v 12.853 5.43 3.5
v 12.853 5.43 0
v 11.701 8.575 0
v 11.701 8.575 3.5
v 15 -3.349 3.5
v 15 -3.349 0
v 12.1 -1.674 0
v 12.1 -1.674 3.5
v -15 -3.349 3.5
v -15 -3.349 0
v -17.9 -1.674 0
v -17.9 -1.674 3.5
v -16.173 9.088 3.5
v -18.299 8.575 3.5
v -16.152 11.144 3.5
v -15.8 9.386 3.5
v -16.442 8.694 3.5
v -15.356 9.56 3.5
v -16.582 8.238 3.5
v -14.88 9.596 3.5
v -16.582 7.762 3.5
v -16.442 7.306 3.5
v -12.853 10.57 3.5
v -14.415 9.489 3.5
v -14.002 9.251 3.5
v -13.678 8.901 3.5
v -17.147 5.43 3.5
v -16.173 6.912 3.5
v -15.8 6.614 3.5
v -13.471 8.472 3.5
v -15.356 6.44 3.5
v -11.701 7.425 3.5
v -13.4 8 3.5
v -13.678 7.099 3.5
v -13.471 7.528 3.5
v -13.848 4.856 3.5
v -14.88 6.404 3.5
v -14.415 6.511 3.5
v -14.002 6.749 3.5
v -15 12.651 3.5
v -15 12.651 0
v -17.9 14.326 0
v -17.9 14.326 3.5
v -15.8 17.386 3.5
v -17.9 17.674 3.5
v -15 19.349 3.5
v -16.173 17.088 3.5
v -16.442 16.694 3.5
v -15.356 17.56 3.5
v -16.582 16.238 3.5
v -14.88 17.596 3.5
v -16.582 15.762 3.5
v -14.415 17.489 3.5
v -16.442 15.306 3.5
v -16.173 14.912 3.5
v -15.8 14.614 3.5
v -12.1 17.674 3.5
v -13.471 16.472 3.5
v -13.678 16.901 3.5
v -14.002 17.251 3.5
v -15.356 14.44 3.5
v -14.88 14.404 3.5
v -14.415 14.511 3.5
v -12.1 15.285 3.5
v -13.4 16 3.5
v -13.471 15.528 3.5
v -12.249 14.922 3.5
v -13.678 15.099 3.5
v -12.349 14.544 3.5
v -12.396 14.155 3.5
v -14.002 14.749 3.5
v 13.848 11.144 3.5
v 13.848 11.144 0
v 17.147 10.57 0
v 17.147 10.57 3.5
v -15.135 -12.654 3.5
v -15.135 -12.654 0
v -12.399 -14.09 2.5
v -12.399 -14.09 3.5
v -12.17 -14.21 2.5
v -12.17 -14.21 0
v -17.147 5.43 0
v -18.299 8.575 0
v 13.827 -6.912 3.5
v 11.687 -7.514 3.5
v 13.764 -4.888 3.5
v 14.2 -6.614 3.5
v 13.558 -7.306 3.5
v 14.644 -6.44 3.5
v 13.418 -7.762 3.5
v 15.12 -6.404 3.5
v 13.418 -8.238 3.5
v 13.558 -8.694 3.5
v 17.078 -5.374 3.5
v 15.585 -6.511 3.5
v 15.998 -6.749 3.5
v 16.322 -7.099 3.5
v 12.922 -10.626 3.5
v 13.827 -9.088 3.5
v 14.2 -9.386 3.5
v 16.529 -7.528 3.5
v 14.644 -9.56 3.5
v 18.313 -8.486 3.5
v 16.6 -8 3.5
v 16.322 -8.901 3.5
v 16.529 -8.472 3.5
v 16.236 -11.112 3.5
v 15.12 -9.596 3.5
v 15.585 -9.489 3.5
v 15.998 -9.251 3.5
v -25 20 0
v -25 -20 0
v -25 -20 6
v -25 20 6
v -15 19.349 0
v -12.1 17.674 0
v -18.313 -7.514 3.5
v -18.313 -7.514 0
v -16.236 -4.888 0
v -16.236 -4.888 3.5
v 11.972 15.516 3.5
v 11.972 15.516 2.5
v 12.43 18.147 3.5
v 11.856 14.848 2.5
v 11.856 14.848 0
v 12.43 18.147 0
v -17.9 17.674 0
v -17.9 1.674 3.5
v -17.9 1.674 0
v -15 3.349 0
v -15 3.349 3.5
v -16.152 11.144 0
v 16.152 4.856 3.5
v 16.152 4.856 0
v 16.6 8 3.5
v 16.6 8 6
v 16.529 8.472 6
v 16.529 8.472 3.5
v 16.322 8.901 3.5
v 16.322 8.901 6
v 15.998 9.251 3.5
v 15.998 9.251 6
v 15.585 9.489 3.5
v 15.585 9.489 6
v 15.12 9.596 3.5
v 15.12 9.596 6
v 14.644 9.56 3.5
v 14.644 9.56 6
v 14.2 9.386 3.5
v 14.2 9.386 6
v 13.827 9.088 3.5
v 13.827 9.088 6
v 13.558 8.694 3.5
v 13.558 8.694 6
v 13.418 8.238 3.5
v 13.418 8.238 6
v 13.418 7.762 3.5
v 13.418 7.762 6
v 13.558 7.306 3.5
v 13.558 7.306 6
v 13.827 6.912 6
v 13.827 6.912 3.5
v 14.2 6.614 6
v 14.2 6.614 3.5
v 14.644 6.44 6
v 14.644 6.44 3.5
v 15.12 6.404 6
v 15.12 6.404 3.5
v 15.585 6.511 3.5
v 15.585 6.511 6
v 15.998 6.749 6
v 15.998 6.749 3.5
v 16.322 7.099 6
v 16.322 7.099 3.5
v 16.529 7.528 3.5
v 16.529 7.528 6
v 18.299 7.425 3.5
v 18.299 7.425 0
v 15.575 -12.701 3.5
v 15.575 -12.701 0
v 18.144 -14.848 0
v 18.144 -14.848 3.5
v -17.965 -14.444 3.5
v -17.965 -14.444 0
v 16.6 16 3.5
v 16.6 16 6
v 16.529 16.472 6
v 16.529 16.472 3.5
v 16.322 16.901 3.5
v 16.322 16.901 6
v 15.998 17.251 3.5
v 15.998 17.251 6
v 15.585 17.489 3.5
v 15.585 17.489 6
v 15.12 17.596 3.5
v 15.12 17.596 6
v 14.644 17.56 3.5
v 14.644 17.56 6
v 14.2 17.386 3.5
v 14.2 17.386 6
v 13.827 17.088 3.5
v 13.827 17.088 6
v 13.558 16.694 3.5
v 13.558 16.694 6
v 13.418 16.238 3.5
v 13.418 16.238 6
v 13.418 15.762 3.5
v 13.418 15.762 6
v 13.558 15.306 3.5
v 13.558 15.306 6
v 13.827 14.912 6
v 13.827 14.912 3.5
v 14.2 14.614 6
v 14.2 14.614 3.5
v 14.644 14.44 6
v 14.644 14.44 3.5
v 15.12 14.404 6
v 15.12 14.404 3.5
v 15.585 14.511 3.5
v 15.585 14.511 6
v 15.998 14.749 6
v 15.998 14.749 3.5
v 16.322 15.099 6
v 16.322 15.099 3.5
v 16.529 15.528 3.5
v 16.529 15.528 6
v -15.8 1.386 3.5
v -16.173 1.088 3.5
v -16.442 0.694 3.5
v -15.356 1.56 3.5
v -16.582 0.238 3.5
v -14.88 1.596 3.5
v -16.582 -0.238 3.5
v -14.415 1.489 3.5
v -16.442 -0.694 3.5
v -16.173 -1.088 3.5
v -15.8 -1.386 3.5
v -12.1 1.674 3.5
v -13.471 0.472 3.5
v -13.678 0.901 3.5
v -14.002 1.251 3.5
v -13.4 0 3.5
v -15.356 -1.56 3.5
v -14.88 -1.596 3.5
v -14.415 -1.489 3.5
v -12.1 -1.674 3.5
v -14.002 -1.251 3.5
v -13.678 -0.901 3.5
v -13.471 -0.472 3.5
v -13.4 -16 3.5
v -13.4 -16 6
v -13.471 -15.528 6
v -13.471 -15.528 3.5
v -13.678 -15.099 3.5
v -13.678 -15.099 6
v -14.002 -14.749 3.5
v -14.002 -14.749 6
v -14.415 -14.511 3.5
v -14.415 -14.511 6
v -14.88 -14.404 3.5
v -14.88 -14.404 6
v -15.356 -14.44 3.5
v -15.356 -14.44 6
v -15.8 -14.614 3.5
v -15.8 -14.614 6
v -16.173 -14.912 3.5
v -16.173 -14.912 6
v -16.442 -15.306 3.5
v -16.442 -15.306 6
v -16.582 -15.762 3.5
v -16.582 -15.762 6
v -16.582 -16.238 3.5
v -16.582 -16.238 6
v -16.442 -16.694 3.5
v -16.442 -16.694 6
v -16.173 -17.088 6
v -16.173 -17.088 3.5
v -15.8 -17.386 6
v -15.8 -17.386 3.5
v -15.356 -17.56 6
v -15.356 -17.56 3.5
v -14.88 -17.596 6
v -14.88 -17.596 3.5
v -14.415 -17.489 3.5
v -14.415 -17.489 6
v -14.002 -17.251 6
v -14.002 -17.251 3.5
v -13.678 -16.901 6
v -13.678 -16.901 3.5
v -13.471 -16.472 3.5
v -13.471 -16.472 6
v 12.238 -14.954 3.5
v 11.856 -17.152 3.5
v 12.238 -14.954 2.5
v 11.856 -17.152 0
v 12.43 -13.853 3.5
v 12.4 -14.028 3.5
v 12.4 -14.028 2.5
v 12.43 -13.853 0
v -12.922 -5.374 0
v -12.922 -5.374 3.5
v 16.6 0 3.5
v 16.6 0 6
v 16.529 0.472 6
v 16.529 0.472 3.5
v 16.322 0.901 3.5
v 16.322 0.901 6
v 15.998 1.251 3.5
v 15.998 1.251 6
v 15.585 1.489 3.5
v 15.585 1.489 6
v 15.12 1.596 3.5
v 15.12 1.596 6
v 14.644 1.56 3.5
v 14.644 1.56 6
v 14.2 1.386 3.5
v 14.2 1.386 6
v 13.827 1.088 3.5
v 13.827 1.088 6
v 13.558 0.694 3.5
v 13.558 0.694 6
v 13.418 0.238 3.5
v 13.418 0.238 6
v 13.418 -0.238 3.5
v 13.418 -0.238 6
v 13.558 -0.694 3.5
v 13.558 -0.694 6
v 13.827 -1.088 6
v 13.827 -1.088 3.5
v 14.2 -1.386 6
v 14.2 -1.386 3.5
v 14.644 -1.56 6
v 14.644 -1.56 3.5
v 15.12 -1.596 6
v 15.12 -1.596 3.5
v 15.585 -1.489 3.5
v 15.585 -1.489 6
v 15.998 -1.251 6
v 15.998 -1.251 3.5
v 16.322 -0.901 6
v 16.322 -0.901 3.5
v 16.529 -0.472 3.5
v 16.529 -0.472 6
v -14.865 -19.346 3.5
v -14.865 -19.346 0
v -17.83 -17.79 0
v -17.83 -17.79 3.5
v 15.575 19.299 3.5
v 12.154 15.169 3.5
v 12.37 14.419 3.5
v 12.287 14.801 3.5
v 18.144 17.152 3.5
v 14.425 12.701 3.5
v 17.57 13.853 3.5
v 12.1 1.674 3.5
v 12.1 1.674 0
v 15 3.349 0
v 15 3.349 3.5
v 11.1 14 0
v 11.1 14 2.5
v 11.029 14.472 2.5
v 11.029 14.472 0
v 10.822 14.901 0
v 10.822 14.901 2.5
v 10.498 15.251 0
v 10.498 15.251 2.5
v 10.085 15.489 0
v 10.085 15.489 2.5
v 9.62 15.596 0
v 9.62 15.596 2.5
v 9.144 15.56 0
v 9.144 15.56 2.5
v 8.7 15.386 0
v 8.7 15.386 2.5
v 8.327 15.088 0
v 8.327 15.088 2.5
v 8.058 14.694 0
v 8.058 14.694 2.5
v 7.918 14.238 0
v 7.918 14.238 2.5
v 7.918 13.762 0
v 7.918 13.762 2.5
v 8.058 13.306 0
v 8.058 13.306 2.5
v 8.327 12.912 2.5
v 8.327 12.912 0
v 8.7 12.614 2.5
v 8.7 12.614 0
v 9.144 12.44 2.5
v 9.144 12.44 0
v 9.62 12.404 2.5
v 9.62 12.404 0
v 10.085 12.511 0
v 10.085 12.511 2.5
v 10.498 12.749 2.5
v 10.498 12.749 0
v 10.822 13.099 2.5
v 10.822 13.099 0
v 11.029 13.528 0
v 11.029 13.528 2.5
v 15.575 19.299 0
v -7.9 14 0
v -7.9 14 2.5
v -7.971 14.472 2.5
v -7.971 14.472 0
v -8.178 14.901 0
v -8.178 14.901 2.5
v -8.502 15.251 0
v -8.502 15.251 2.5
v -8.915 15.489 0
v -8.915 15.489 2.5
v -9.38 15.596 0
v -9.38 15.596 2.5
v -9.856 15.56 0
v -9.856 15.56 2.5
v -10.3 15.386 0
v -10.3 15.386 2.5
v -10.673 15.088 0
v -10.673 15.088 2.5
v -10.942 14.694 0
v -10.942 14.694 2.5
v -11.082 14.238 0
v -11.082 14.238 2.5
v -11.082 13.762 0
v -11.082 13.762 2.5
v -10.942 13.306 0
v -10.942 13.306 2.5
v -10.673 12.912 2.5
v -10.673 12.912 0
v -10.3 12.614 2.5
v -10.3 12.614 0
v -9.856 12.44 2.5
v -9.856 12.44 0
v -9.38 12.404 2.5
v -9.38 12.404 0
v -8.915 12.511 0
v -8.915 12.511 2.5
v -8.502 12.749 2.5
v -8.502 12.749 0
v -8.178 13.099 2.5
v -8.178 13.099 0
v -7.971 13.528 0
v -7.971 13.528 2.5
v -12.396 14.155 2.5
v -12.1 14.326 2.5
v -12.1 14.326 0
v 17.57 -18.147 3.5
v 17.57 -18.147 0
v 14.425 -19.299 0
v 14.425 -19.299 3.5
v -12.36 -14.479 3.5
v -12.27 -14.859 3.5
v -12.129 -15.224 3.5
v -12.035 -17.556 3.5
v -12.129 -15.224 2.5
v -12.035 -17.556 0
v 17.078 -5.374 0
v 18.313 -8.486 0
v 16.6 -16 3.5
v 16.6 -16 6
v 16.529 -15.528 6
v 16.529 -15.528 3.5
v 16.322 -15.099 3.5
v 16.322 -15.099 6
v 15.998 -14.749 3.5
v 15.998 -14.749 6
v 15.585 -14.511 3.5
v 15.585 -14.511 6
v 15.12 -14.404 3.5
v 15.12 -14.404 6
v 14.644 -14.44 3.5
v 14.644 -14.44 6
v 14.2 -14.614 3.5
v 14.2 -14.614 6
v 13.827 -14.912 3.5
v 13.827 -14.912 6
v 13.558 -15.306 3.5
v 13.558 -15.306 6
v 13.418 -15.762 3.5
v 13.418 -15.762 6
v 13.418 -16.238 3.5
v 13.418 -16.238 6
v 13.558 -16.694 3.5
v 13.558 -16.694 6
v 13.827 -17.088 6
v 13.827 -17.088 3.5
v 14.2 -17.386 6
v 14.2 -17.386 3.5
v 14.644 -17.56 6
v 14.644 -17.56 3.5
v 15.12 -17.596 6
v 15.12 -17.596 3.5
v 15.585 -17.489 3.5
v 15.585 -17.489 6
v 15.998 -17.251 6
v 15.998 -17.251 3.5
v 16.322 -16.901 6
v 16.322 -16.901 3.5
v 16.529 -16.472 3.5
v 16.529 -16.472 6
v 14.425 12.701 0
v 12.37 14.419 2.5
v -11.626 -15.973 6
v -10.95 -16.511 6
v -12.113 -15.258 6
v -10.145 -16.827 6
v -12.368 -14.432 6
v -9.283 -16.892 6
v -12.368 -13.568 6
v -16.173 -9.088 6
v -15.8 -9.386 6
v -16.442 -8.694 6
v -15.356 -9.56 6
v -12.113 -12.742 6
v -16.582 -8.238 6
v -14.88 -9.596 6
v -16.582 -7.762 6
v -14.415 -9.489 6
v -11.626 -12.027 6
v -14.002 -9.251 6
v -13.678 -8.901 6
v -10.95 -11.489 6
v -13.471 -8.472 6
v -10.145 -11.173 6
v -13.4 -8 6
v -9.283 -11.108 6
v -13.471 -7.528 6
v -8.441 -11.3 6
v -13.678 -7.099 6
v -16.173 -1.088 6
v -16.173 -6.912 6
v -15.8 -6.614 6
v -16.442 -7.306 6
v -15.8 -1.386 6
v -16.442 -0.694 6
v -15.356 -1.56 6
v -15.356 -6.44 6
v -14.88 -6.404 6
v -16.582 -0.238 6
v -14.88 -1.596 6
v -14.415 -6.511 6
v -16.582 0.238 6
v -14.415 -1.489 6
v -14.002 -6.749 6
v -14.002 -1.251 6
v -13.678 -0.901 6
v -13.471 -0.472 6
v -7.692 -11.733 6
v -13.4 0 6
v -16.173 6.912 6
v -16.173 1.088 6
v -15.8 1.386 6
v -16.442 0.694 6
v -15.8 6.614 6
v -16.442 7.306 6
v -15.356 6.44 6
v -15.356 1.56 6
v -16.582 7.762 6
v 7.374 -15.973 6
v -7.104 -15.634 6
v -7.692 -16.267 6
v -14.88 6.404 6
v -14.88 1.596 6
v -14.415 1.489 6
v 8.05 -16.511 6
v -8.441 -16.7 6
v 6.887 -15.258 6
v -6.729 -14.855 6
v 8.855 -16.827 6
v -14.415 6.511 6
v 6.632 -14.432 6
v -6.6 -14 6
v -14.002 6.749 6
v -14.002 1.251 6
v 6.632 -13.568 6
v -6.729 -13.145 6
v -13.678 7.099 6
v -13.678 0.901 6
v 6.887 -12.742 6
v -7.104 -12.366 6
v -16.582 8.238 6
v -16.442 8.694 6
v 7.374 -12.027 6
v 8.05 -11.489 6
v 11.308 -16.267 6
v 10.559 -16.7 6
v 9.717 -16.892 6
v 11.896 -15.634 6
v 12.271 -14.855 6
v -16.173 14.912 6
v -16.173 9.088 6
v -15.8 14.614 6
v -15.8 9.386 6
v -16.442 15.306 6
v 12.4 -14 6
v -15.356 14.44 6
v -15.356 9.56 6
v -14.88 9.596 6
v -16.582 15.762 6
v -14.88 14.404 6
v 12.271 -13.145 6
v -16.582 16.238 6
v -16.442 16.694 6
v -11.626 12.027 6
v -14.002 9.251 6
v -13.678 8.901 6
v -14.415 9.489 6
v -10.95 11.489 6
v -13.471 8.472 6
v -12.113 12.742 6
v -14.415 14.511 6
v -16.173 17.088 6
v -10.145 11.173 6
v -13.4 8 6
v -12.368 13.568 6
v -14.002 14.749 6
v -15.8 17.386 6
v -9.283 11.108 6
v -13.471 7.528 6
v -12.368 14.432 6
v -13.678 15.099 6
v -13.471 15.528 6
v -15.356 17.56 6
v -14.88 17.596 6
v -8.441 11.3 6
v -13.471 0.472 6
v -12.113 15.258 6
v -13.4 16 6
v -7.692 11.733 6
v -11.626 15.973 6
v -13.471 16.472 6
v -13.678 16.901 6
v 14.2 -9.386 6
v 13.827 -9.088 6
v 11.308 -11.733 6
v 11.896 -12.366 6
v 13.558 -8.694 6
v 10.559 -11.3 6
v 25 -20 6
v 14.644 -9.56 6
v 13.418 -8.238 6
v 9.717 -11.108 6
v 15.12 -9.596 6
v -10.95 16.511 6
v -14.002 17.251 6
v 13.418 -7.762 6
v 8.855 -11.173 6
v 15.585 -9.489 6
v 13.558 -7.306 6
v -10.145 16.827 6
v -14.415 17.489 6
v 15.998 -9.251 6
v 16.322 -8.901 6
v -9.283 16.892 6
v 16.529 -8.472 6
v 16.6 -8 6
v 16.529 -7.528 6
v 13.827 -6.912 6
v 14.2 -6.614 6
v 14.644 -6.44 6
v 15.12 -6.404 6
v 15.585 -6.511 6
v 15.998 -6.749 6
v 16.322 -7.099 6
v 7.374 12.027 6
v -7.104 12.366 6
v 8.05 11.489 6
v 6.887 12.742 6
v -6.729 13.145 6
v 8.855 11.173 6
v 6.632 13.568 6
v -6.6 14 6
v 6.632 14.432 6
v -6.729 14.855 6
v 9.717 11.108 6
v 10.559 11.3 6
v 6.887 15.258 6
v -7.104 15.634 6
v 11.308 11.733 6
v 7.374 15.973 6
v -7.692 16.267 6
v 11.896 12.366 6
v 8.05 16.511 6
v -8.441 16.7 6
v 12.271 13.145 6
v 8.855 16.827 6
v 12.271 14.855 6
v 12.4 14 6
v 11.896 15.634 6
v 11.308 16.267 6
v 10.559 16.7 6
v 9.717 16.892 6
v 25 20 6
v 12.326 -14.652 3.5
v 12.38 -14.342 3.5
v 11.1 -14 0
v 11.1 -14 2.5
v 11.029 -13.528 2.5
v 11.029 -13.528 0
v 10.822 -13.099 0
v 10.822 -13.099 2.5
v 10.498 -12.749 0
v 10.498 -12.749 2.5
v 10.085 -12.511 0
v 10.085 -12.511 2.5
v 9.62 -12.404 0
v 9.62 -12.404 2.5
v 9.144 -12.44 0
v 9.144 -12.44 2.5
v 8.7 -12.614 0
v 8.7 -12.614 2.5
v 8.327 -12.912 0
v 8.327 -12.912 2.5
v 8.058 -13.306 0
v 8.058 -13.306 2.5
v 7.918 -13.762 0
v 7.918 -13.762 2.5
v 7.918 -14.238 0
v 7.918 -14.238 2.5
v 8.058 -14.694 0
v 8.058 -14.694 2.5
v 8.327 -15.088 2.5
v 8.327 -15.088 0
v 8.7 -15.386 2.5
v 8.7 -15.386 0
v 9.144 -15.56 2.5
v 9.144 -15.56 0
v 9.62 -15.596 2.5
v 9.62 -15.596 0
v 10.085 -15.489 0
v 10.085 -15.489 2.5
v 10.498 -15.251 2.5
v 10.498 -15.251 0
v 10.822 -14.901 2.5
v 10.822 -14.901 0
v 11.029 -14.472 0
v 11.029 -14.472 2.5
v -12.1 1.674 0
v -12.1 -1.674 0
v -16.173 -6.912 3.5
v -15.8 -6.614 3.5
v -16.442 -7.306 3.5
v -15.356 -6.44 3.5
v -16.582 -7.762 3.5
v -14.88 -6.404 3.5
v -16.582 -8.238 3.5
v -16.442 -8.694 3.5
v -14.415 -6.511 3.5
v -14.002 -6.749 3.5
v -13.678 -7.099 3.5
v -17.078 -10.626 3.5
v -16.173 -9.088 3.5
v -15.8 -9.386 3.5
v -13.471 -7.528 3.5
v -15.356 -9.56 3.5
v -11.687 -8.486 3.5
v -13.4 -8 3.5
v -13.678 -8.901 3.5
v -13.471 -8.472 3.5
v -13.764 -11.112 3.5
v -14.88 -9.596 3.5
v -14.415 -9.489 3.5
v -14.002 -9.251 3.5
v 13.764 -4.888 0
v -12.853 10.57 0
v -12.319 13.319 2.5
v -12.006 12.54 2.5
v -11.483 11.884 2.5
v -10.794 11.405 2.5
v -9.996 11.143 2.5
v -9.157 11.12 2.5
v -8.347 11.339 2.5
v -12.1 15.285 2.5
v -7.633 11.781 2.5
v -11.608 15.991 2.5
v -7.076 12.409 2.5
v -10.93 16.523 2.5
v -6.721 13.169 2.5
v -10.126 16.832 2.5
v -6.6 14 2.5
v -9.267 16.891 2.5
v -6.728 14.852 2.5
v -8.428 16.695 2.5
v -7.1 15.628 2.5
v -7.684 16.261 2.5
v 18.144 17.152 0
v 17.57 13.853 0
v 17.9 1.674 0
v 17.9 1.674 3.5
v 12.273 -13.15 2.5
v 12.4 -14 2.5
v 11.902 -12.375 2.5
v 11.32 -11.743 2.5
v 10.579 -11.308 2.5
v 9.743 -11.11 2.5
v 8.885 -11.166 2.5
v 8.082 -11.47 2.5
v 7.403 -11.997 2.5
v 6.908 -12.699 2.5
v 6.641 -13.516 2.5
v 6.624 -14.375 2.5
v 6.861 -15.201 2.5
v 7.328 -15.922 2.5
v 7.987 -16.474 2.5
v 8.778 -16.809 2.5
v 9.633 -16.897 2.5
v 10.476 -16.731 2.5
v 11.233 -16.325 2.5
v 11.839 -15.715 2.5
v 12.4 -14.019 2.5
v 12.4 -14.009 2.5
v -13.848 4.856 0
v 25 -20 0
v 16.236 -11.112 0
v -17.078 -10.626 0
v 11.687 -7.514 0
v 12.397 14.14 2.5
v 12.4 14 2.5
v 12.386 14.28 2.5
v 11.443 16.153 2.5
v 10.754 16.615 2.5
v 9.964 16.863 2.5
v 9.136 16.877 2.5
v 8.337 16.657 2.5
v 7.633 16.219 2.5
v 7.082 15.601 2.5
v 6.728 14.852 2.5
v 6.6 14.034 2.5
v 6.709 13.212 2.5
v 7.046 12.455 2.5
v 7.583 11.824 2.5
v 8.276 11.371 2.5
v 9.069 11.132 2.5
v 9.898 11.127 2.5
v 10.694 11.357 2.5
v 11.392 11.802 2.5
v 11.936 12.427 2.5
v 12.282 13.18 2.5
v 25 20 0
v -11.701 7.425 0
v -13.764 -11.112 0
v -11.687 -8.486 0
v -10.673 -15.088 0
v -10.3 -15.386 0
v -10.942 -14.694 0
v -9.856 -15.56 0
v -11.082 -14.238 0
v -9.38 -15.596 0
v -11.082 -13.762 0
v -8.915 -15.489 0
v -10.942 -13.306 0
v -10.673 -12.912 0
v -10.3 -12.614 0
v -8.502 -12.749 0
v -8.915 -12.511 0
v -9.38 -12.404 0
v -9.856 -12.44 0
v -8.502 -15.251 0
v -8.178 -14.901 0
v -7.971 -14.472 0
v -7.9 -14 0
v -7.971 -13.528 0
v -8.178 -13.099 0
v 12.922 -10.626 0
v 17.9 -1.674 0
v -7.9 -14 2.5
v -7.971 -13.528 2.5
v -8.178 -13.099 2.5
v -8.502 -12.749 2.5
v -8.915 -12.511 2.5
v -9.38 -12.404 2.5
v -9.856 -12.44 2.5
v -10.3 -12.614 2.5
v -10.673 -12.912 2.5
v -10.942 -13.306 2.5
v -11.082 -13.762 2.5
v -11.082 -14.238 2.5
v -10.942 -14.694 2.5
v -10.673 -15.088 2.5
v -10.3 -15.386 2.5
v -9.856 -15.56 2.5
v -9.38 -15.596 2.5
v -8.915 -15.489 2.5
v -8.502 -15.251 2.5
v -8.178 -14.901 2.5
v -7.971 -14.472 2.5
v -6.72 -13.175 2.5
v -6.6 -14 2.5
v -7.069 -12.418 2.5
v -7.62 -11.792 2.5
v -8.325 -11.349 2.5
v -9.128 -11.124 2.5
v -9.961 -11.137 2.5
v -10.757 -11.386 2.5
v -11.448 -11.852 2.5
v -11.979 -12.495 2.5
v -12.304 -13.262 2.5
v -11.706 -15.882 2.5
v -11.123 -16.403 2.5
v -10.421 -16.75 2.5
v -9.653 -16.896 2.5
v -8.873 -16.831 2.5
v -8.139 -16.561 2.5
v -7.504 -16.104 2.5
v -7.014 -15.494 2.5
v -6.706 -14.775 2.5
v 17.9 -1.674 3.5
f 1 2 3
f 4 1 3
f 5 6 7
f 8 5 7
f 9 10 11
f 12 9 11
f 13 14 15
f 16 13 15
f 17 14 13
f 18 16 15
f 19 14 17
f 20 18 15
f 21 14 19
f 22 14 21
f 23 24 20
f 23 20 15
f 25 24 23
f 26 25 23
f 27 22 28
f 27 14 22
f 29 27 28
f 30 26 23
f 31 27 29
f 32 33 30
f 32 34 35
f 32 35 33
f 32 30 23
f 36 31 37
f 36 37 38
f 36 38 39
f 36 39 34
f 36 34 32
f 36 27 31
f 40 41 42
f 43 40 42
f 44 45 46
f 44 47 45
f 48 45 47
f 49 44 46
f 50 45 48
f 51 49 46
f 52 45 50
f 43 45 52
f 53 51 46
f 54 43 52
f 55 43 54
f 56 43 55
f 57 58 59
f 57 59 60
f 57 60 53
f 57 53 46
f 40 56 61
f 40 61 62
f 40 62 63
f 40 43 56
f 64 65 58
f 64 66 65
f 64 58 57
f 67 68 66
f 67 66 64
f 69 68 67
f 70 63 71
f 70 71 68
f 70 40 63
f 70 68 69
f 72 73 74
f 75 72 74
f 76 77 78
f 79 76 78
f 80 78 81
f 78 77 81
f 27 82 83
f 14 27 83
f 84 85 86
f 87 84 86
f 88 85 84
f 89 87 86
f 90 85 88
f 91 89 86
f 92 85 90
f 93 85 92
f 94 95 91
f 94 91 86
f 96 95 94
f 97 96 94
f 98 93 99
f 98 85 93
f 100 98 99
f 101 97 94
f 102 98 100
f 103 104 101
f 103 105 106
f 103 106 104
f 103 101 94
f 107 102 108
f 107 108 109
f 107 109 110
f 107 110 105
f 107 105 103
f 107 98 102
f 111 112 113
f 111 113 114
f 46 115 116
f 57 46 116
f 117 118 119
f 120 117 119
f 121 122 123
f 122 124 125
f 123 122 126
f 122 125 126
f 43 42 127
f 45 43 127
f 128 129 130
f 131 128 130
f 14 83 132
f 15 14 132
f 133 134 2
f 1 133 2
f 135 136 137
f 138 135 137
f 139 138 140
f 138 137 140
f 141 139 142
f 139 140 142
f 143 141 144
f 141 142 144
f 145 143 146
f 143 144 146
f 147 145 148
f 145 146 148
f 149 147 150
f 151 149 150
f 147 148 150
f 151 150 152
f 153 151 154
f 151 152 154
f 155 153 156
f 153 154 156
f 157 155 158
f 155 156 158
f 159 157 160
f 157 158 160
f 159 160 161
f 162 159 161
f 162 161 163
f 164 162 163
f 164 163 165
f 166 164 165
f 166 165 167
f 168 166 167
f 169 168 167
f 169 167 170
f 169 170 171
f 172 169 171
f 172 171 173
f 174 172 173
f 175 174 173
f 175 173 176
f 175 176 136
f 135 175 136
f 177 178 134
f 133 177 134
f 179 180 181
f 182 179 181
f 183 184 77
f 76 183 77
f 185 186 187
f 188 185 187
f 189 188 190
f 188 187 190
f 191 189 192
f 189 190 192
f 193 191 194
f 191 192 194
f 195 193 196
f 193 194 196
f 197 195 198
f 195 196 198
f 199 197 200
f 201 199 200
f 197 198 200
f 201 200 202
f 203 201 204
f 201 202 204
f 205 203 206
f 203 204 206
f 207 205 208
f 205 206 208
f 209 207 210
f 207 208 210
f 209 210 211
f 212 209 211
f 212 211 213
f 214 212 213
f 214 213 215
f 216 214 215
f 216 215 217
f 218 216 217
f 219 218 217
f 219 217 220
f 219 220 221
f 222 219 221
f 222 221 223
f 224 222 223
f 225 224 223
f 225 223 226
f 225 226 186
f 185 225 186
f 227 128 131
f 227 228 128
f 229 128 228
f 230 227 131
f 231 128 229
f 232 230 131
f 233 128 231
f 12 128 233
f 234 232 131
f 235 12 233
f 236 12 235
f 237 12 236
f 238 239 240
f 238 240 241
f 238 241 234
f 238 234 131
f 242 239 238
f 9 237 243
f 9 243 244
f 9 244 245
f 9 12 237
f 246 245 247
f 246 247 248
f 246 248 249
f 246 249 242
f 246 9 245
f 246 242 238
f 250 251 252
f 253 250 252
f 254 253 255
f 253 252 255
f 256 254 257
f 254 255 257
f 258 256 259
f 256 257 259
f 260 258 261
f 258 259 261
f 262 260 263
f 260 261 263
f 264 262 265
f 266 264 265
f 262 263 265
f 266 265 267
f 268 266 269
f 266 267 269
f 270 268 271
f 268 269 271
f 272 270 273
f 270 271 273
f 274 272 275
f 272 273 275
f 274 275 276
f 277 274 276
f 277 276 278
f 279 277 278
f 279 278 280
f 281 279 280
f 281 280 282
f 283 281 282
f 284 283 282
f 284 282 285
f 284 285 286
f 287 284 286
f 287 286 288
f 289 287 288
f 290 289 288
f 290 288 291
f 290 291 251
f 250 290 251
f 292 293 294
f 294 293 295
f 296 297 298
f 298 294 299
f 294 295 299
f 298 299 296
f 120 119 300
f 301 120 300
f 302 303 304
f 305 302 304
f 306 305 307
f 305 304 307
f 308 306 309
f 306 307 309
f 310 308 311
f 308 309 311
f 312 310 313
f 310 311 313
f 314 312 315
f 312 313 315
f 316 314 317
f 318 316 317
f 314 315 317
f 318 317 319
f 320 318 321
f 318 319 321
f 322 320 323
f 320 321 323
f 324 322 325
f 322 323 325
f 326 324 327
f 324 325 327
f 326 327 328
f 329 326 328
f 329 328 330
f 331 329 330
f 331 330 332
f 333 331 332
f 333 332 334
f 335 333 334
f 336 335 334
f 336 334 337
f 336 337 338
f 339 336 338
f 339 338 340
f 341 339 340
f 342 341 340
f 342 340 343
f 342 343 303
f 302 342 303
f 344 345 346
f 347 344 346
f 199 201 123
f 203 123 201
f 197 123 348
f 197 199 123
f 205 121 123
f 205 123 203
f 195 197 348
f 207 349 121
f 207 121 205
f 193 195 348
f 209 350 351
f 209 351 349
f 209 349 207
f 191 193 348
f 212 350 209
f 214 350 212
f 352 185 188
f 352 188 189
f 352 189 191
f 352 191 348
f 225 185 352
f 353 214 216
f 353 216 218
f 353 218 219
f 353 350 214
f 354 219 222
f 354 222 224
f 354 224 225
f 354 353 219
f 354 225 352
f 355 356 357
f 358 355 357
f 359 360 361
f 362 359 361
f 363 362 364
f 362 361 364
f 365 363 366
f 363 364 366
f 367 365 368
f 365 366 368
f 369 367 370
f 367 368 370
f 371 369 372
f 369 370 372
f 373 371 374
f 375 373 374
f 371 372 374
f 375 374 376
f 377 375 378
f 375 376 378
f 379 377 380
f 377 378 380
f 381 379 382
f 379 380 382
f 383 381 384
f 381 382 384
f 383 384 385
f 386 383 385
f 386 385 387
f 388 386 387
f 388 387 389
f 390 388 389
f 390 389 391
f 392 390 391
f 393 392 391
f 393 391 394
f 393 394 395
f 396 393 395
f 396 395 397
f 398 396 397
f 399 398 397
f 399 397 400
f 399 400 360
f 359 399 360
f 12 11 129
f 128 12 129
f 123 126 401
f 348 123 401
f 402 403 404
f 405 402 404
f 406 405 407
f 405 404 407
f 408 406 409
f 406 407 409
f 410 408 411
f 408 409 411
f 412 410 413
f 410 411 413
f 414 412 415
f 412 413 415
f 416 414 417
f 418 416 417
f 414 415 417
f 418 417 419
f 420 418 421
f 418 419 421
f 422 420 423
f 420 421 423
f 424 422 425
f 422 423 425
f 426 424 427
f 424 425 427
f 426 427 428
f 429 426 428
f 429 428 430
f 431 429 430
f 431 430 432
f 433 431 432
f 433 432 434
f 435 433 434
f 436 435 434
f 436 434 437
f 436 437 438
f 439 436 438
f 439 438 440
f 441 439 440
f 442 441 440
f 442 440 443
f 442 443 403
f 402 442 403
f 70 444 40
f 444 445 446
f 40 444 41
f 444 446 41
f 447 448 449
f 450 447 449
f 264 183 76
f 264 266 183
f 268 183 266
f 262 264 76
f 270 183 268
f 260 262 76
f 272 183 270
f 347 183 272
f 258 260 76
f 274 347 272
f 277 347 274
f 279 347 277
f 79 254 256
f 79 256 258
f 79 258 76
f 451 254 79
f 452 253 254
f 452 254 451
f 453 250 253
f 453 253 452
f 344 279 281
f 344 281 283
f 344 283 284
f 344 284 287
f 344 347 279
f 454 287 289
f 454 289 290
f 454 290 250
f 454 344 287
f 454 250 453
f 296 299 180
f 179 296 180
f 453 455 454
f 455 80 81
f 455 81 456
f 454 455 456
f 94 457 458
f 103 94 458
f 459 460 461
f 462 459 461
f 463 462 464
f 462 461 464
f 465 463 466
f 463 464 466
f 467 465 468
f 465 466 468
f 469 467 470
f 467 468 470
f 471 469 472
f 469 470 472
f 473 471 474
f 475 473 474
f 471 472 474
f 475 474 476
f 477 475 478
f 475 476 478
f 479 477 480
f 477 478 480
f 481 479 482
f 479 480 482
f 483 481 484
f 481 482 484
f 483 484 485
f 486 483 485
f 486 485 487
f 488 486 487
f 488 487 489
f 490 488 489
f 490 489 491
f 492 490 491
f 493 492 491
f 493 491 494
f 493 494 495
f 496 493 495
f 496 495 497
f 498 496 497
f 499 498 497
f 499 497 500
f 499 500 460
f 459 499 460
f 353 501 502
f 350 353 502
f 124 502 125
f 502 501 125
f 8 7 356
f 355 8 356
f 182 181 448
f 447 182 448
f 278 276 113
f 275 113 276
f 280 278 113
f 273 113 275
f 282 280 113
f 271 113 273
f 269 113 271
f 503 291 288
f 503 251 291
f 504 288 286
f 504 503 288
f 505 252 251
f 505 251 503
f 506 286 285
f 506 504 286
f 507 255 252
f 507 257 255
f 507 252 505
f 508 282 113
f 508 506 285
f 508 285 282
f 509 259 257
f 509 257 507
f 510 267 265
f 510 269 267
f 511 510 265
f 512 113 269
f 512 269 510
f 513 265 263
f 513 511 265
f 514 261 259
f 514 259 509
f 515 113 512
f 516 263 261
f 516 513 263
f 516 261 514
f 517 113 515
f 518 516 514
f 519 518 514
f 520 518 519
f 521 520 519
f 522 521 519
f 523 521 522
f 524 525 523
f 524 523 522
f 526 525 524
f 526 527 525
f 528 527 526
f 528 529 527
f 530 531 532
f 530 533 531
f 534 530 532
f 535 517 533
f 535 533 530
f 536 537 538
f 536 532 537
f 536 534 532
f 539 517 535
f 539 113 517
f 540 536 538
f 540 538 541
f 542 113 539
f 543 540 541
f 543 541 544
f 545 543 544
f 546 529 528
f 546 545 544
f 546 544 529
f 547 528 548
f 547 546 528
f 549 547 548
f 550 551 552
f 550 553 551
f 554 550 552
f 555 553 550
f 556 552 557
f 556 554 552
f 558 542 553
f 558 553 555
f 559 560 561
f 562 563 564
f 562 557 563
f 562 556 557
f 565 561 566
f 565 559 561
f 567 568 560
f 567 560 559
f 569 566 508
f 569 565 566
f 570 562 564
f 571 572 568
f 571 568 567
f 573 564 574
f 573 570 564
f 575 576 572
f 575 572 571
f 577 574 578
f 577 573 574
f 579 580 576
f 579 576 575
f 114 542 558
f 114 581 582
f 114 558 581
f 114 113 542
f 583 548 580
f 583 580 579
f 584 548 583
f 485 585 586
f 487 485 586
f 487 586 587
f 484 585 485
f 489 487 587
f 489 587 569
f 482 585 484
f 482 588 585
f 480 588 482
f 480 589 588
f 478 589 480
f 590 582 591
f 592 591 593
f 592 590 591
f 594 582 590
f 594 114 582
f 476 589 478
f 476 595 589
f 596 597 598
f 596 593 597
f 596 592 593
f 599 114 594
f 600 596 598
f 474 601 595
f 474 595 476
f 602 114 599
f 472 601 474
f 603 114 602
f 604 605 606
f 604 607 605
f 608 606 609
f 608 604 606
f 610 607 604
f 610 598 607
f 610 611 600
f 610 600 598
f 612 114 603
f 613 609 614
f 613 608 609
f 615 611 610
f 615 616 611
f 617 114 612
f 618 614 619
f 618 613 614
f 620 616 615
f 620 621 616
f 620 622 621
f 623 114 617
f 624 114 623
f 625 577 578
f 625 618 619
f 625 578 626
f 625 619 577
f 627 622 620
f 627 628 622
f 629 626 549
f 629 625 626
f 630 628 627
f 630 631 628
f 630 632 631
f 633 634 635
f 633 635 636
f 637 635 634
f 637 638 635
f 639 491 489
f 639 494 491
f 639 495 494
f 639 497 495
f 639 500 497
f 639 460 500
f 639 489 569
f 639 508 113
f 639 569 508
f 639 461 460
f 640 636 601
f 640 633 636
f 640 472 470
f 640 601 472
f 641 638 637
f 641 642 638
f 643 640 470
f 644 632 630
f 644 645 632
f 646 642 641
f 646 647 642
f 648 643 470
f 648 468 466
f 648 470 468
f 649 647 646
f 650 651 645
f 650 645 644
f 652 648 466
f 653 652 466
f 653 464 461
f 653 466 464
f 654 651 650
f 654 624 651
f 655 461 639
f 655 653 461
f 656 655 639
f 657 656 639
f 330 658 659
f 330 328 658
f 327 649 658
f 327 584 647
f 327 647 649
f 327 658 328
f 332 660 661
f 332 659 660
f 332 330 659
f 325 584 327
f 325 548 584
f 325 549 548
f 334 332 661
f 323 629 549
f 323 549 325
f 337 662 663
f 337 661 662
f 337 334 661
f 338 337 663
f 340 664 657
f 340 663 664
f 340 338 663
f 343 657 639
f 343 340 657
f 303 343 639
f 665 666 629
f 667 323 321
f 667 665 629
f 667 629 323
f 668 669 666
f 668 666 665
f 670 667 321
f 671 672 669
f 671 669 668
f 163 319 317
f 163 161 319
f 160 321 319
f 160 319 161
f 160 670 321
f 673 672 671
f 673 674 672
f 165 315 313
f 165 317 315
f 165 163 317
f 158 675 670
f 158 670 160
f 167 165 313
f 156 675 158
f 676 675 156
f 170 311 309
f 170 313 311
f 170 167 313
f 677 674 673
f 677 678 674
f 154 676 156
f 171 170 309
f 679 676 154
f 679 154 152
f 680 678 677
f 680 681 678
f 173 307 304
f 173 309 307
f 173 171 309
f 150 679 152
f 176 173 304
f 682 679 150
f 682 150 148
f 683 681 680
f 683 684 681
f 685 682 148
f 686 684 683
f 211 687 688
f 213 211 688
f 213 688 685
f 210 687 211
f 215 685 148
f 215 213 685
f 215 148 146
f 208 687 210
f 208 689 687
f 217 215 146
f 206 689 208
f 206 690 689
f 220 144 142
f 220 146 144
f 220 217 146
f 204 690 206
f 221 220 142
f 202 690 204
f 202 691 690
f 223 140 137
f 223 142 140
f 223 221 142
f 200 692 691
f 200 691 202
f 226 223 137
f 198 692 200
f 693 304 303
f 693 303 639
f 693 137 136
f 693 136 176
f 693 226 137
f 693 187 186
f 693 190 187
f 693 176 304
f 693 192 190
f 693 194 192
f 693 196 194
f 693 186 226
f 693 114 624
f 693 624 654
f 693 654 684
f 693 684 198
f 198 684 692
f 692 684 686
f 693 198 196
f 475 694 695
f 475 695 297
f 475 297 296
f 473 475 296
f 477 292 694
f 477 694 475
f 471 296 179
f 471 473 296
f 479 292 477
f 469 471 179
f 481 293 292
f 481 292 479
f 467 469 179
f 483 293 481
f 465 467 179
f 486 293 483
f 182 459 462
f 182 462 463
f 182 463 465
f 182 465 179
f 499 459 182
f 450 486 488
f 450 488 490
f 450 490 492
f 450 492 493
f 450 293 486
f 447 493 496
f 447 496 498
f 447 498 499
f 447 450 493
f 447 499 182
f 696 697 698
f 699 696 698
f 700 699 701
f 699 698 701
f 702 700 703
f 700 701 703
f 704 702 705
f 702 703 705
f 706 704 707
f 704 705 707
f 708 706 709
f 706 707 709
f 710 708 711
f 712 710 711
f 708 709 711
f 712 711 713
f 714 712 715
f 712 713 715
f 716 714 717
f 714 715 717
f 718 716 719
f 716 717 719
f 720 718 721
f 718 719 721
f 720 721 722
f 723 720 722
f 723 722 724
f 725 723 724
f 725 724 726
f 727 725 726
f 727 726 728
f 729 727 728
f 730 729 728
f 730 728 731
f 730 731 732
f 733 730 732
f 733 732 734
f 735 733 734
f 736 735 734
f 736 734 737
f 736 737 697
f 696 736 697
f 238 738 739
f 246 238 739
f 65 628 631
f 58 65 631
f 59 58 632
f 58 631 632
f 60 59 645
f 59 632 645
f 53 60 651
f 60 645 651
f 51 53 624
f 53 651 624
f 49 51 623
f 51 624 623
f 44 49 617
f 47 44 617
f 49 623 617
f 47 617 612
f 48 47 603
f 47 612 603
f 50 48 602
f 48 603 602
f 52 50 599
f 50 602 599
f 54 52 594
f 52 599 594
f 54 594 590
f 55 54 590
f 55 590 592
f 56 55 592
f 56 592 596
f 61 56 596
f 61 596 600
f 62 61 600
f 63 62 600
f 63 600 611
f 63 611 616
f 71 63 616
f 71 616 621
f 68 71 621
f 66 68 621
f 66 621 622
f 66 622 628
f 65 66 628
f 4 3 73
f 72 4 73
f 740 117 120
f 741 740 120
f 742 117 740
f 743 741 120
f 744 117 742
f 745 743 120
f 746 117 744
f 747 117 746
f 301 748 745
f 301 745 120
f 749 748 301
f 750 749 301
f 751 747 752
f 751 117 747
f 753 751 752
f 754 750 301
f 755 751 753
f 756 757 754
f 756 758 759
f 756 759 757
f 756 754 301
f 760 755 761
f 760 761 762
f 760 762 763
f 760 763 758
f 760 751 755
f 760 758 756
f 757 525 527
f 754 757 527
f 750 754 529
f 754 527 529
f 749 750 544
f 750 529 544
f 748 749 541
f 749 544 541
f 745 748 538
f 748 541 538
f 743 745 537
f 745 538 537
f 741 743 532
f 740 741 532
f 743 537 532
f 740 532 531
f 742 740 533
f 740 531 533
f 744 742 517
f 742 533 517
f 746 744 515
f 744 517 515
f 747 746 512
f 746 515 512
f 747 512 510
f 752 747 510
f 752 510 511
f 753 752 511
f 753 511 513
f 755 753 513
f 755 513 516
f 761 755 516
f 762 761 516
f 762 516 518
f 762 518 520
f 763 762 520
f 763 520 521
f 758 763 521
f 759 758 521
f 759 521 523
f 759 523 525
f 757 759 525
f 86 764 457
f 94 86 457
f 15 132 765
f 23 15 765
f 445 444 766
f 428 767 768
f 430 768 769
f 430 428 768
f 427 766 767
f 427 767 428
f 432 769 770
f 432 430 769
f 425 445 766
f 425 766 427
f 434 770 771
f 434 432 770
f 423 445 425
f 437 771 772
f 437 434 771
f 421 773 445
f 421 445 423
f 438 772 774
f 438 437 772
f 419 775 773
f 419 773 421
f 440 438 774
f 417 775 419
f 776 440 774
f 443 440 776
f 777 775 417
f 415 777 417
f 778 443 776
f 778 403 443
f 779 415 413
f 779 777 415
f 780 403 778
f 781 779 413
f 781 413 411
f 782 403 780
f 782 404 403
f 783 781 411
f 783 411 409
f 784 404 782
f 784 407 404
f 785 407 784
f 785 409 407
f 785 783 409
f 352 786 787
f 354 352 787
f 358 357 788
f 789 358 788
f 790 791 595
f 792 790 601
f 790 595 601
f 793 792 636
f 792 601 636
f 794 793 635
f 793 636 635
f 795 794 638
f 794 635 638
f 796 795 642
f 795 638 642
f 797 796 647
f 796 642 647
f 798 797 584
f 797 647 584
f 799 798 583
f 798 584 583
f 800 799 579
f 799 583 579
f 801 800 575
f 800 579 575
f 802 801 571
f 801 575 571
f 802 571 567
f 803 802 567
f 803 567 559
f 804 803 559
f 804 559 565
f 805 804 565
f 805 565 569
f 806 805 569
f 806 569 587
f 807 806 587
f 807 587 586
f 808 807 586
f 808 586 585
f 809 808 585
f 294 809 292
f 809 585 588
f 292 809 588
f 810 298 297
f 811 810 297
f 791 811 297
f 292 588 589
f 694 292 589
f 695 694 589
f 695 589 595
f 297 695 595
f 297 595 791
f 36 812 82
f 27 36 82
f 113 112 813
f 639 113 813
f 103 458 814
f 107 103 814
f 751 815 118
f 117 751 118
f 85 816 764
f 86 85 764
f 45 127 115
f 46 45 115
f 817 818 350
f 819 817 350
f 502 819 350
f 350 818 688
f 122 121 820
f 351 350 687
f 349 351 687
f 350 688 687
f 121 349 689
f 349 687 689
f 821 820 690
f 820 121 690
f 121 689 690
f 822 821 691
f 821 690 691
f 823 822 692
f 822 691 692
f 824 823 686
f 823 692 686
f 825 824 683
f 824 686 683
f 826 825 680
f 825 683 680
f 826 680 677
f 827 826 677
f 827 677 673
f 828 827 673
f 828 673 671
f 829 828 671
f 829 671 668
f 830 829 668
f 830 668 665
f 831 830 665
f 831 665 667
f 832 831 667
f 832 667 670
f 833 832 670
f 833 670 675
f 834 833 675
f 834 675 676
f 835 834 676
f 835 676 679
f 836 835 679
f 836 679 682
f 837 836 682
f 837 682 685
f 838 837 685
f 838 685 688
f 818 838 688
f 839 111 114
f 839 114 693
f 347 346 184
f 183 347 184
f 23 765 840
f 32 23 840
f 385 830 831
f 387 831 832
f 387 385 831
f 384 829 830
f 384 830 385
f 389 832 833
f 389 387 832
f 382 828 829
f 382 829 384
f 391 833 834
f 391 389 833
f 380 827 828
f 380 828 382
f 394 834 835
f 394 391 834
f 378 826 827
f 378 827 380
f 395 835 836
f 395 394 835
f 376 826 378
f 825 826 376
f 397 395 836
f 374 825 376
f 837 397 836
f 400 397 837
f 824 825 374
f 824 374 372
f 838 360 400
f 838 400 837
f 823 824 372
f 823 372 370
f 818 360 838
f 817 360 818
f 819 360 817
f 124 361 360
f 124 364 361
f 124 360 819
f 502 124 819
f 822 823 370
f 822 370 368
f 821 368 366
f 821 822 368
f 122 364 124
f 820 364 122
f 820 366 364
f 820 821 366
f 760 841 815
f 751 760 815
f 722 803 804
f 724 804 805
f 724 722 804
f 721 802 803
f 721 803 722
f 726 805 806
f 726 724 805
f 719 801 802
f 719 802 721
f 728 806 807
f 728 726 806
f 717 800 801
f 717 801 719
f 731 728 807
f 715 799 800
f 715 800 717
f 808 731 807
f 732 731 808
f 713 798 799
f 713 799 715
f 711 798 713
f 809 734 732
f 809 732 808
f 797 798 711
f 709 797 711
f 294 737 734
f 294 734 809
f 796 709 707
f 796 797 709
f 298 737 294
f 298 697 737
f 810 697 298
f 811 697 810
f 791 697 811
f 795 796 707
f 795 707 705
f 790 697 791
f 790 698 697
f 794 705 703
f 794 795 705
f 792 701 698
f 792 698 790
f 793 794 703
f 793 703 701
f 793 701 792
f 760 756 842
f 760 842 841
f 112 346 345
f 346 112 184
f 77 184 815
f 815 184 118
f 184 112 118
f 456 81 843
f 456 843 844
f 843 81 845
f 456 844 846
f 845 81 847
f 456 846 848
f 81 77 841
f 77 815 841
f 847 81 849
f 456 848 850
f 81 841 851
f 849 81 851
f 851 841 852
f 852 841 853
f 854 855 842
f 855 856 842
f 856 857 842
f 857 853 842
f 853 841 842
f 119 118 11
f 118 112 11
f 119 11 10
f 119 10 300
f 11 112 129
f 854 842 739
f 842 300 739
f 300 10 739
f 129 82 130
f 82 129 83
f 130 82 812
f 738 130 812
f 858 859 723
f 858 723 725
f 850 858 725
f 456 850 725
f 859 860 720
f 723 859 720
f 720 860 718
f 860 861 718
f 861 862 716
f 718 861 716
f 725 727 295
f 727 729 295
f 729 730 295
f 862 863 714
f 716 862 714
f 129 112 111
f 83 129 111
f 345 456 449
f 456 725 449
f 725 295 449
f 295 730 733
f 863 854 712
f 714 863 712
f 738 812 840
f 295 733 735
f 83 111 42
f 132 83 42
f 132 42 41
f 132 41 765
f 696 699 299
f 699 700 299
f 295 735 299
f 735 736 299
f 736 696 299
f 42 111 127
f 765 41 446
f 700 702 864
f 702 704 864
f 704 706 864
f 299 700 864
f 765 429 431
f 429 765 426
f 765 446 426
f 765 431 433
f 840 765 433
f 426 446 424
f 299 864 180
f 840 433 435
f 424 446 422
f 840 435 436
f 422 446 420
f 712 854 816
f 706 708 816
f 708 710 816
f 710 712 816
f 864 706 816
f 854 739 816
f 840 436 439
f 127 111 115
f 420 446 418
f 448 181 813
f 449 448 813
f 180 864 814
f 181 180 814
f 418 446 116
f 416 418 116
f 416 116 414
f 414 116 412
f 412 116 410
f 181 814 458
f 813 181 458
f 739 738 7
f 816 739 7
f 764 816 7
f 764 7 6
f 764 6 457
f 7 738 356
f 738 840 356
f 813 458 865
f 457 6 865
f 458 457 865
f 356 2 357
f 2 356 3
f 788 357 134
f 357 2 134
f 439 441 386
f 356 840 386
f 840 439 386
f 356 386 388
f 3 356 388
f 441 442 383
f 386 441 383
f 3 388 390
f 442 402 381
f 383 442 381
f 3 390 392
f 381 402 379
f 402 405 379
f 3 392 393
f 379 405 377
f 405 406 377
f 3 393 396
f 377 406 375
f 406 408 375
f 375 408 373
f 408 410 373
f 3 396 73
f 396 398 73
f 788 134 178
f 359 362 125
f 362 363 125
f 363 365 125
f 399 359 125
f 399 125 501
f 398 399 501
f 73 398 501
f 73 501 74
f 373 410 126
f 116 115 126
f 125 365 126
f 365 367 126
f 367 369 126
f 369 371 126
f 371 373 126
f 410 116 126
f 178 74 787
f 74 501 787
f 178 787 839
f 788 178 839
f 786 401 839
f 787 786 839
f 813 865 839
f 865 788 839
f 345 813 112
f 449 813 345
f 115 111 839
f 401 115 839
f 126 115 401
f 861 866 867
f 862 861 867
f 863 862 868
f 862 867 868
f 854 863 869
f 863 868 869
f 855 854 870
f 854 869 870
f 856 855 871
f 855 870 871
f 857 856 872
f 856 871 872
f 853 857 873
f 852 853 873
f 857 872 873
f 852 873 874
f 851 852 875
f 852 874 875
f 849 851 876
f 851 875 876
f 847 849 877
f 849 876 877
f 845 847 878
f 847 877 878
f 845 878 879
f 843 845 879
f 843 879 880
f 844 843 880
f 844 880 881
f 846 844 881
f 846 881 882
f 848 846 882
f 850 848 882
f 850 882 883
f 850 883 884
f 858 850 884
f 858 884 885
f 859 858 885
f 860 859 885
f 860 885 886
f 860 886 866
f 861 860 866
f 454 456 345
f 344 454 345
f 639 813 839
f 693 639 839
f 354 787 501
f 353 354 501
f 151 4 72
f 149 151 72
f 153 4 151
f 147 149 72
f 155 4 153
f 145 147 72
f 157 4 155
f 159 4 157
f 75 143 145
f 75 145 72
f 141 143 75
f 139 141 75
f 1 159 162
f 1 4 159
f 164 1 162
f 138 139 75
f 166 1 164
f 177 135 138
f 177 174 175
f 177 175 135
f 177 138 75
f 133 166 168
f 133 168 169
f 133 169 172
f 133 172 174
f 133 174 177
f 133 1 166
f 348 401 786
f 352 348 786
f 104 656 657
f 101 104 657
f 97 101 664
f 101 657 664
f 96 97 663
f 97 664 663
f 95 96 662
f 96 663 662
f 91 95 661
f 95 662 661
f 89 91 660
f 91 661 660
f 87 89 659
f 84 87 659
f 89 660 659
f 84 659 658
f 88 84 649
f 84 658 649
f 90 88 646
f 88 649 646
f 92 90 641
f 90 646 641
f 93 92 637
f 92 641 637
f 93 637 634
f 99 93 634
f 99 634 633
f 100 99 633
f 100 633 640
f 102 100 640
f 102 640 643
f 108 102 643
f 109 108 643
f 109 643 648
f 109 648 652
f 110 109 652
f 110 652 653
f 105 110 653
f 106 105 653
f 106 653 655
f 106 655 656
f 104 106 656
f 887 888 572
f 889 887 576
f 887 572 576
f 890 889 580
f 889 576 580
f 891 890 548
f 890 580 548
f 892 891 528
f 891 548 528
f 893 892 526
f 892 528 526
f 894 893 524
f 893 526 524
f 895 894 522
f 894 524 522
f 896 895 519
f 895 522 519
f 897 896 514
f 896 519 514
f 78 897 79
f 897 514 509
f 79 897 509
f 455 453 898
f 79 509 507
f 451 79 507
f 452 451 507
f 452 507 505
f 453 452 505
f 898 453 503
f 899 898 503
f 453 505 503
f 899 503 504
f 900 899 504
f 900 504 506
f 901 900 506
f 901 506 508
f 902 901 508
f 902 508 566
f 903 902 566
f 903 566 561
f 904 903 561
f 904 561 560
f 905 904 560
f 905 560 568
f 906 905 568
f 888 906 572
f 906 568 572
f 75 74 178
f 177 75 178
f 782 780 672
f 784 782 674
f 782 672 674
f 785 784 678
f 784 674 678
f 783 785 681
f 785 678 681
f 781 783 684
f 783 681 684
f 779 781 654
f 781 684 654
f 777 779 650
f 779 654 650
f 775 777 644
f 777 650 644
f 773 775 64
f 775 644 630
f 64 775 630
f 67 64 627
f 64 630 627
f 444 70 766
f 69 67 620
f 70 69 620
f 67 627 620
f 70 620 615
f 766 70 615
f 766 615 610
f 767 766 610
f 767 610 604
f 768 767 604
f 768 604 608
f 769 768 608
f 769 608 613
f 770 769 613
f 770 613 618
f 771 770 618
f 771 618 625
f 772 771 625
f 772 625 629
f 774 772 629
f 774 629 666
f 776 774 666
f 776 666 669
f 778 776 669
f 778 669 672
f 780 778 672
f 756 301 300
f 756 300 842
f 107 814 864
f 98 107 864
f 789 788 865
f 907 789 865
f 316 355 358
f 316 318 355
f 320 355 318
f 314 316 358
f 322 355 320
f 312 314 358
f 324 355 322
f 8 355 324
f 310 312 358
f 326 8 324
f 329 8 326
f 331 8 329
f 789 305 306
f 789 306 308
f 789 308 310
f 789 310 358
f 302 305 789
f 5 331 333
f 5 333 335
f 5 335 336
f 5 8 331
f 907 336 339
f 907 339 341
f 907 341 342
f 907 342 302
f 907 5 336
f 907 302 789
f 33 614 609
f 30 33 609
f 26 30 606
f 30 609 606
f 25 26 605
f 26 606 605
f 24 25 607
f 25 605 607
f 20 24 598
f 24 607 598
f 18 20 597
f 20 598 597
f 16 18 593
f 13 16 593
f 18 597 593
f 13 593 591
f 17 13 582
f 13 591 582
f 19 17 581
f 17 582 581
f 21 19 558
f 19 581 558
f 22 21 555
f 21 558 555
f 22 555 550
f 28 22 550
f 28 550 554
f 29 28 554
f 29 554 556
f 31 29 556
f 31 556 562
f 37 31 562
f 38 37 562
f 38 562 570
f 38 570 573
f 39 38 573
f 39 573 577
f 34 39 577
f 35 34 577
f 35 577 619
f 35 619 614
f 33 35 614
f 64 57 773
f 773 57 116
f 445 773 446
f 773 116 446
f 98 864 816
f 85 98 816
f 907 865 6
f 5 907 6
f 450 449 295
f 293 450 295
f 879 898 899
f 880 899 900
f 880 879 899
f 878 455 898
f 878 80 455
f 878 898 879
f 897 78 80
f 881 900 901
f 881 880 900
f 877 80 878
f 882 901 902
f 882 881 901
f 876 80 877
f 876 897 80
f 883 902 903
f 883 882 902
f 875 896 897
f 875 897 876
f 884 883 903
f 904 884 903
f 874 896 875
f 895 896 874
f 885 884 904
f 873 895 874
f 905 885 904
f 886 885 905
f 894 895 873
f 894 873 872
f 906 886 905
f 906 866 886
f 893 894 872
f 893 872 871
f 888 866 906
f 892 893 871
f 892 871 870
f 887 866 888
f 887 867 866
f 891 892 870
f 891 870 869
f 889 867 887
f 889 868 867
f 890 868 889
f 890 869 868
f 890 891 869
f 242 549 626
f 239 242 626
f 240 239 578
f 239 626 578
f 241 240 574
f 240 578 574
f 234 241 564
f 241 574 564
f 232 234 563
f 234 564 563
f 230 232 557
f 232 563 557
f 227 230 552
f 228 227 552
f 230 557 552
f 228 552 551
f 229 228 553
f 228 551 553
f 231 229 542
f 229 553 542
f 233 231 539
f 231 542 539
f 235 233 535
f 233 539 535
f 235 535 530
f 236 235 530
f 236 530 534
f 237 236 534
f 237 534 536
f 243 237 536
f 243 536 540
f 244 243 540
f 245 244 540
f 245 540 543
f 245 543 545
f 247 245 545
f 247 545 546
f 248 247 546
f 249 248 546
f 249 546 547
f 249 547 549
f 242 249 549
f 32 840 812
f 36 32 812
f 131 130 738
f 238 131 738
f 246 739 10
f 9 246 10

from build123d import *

# Parameters (mm, degrees)
F0_W     = 50
F0_H     = 40
F1_DEPTH = 6
F2_R     = 2.9
F3_DEPTH = 3.5
F4_R     = 1.6
F5_DEPTH = 25
F6_R     = 1.6
F7_DEPTH = 25
F9_DEPTH = 3.5


with BuildPart() as f1:
    # F0 (on Top) → F1 (new body)
    with BuildSketch(Plane.XY):
        Rectangle(F0_W, F0_H)
    extrude(amount=F1_DEPTH)

    # F2 (on face) → F3 (cut)
    with BuildSketch(Plane.XY.offset(6)):
        with Locations((-9.5, 14)):
            Circle(F2_R)
        with Locations((-9.5, -14)):
            Circle(F2_R)
        with Locations((9.5, 14)):
            Circle(F2_R)
        with Locations((9.5, -14)):
            Circle(F2_R)
    extrude(amount=-F3_DEPTH, mode=Mode.SUBTRACT)

    # F4 (on face) → F5 (cut)
    with BuildSketch(Plane.XY.offset(2.5)):
        with Locations((-9.5, 14)):
            Circle(F4_R)
        with Locations((-9.5, -14)):
            Circle(F4_R)
        with Locations((9.5, 14)):
            Circle(F4_R)
        with Locations((9.5, -14)):
            Circle(F4_R)
    extrude(amount=-F5_DEPTH, mode=Mode.SUBTRACT)

    # F6 (on face) → F7 (cut)
    with BuildSketch(Plane.XY.offset(6)):
        with Locations((-15, 0)):
            Circle(F6_R)
        with Locations((-15, 8)):
            Circle(F6_R)
        with Locations((-15, -8)):
            Circle(F6_R)
        with Locations((15, 0)):
            Circle(F6_R)
        with Locations((15, 8)):
            Circle(F6_R)
        with Locations((15, -8)):
            Circle(F6_R)
        with Locations((-15, -16)):
            Circle(F6_R)
        with Locations((15, 16)):
            Circle(F6_R)
        with Locations((-15, 16)):
            Circle(F6_R)
        with Locations((15, -16)):
            Circle(F6_R)
    extrude(amount=-F7_DEPTH, mode=Mode.SUBTRACT)

    # F8 (on face) → F9 (cut)
    with BuildSketch(Plane(origin=(0, 0, 0), x_dir=(1, 0, 0), z_dir=(0, 0, -1))):
        Polygon((-12.1, -1.674316), (-12.1, 1.674316), (-15, 3.348632), (-17.9, 1.674316), (-17.9, -1.674316), (-15, -3.348632), align=None)
        Polygon((-11.686842, 8.486128), (-13.76442, 11.112343), (-17.077578, 10.626215), (-18.313158, 7.513872), (-16.23558, 4.887657), (-12.922422, 5.373785), align=None)
        Polygon((-11.701039, -7.425379), (-13.848156, -4.855705), (-17.147117, -5.430327), (-18.298961, -8.574621), (-16.151844, -11.144295), (-12.852883, -10.569673), align=None)
        Polygon((17.9, -1.674316), (17.9, 1.674316), (15, 3.348632), (12.1, 1.674316), (12.1, -1.674316), (15, -3.348632), align=None)
        Polygon((18.313158, 8.486128), (16.23558, 11.112343), (12.922422, 10.626215), (11.686842, 7.513872), (13.76442, 4.887657), (17.077578, 5.373785), align=None)
        Polygon((18.298961, -7.425379), (16.151844, -4.855705), (12.852883, -5.430327), (11.701039, -8.574621), (13.848156, -11.144295), (17.147117, -10.569673), align=None)
        Polygon((-12.03478, 17.555894), (-14.864834, 19.345902), (-17.830053, 17.790009), (-17.96522, 14.444106), (-15.135166, 12.654098), (-12.169947, 14.209991), align=None)
        Polygon((-17.9, -14.325684), (-17.9, -17.674316), (-15, -19.348632), (-12.1, -17.674316), (-12.1, -14.325684), (-15, -12.651368), align=None)
        Polygon((18.144295, 14.848156), (17.569673, 18.147117), (14.425379, 19.298961), (11.855705, 17.151844), (12.430327, 13.852883), (15.574621, 12.701039), align=None)
        Polygon((18.144295, -17.151844), (17.569673, -13.852883), (14.425379, -12.701039), (11.855705, -14.848156), (12.430327, -18.147117), (15.574621, -19.298961), align=None)
    extrude(amount=-F9_DEPTH, mode=Mode.SUBTRACT)


solid = f1.part
